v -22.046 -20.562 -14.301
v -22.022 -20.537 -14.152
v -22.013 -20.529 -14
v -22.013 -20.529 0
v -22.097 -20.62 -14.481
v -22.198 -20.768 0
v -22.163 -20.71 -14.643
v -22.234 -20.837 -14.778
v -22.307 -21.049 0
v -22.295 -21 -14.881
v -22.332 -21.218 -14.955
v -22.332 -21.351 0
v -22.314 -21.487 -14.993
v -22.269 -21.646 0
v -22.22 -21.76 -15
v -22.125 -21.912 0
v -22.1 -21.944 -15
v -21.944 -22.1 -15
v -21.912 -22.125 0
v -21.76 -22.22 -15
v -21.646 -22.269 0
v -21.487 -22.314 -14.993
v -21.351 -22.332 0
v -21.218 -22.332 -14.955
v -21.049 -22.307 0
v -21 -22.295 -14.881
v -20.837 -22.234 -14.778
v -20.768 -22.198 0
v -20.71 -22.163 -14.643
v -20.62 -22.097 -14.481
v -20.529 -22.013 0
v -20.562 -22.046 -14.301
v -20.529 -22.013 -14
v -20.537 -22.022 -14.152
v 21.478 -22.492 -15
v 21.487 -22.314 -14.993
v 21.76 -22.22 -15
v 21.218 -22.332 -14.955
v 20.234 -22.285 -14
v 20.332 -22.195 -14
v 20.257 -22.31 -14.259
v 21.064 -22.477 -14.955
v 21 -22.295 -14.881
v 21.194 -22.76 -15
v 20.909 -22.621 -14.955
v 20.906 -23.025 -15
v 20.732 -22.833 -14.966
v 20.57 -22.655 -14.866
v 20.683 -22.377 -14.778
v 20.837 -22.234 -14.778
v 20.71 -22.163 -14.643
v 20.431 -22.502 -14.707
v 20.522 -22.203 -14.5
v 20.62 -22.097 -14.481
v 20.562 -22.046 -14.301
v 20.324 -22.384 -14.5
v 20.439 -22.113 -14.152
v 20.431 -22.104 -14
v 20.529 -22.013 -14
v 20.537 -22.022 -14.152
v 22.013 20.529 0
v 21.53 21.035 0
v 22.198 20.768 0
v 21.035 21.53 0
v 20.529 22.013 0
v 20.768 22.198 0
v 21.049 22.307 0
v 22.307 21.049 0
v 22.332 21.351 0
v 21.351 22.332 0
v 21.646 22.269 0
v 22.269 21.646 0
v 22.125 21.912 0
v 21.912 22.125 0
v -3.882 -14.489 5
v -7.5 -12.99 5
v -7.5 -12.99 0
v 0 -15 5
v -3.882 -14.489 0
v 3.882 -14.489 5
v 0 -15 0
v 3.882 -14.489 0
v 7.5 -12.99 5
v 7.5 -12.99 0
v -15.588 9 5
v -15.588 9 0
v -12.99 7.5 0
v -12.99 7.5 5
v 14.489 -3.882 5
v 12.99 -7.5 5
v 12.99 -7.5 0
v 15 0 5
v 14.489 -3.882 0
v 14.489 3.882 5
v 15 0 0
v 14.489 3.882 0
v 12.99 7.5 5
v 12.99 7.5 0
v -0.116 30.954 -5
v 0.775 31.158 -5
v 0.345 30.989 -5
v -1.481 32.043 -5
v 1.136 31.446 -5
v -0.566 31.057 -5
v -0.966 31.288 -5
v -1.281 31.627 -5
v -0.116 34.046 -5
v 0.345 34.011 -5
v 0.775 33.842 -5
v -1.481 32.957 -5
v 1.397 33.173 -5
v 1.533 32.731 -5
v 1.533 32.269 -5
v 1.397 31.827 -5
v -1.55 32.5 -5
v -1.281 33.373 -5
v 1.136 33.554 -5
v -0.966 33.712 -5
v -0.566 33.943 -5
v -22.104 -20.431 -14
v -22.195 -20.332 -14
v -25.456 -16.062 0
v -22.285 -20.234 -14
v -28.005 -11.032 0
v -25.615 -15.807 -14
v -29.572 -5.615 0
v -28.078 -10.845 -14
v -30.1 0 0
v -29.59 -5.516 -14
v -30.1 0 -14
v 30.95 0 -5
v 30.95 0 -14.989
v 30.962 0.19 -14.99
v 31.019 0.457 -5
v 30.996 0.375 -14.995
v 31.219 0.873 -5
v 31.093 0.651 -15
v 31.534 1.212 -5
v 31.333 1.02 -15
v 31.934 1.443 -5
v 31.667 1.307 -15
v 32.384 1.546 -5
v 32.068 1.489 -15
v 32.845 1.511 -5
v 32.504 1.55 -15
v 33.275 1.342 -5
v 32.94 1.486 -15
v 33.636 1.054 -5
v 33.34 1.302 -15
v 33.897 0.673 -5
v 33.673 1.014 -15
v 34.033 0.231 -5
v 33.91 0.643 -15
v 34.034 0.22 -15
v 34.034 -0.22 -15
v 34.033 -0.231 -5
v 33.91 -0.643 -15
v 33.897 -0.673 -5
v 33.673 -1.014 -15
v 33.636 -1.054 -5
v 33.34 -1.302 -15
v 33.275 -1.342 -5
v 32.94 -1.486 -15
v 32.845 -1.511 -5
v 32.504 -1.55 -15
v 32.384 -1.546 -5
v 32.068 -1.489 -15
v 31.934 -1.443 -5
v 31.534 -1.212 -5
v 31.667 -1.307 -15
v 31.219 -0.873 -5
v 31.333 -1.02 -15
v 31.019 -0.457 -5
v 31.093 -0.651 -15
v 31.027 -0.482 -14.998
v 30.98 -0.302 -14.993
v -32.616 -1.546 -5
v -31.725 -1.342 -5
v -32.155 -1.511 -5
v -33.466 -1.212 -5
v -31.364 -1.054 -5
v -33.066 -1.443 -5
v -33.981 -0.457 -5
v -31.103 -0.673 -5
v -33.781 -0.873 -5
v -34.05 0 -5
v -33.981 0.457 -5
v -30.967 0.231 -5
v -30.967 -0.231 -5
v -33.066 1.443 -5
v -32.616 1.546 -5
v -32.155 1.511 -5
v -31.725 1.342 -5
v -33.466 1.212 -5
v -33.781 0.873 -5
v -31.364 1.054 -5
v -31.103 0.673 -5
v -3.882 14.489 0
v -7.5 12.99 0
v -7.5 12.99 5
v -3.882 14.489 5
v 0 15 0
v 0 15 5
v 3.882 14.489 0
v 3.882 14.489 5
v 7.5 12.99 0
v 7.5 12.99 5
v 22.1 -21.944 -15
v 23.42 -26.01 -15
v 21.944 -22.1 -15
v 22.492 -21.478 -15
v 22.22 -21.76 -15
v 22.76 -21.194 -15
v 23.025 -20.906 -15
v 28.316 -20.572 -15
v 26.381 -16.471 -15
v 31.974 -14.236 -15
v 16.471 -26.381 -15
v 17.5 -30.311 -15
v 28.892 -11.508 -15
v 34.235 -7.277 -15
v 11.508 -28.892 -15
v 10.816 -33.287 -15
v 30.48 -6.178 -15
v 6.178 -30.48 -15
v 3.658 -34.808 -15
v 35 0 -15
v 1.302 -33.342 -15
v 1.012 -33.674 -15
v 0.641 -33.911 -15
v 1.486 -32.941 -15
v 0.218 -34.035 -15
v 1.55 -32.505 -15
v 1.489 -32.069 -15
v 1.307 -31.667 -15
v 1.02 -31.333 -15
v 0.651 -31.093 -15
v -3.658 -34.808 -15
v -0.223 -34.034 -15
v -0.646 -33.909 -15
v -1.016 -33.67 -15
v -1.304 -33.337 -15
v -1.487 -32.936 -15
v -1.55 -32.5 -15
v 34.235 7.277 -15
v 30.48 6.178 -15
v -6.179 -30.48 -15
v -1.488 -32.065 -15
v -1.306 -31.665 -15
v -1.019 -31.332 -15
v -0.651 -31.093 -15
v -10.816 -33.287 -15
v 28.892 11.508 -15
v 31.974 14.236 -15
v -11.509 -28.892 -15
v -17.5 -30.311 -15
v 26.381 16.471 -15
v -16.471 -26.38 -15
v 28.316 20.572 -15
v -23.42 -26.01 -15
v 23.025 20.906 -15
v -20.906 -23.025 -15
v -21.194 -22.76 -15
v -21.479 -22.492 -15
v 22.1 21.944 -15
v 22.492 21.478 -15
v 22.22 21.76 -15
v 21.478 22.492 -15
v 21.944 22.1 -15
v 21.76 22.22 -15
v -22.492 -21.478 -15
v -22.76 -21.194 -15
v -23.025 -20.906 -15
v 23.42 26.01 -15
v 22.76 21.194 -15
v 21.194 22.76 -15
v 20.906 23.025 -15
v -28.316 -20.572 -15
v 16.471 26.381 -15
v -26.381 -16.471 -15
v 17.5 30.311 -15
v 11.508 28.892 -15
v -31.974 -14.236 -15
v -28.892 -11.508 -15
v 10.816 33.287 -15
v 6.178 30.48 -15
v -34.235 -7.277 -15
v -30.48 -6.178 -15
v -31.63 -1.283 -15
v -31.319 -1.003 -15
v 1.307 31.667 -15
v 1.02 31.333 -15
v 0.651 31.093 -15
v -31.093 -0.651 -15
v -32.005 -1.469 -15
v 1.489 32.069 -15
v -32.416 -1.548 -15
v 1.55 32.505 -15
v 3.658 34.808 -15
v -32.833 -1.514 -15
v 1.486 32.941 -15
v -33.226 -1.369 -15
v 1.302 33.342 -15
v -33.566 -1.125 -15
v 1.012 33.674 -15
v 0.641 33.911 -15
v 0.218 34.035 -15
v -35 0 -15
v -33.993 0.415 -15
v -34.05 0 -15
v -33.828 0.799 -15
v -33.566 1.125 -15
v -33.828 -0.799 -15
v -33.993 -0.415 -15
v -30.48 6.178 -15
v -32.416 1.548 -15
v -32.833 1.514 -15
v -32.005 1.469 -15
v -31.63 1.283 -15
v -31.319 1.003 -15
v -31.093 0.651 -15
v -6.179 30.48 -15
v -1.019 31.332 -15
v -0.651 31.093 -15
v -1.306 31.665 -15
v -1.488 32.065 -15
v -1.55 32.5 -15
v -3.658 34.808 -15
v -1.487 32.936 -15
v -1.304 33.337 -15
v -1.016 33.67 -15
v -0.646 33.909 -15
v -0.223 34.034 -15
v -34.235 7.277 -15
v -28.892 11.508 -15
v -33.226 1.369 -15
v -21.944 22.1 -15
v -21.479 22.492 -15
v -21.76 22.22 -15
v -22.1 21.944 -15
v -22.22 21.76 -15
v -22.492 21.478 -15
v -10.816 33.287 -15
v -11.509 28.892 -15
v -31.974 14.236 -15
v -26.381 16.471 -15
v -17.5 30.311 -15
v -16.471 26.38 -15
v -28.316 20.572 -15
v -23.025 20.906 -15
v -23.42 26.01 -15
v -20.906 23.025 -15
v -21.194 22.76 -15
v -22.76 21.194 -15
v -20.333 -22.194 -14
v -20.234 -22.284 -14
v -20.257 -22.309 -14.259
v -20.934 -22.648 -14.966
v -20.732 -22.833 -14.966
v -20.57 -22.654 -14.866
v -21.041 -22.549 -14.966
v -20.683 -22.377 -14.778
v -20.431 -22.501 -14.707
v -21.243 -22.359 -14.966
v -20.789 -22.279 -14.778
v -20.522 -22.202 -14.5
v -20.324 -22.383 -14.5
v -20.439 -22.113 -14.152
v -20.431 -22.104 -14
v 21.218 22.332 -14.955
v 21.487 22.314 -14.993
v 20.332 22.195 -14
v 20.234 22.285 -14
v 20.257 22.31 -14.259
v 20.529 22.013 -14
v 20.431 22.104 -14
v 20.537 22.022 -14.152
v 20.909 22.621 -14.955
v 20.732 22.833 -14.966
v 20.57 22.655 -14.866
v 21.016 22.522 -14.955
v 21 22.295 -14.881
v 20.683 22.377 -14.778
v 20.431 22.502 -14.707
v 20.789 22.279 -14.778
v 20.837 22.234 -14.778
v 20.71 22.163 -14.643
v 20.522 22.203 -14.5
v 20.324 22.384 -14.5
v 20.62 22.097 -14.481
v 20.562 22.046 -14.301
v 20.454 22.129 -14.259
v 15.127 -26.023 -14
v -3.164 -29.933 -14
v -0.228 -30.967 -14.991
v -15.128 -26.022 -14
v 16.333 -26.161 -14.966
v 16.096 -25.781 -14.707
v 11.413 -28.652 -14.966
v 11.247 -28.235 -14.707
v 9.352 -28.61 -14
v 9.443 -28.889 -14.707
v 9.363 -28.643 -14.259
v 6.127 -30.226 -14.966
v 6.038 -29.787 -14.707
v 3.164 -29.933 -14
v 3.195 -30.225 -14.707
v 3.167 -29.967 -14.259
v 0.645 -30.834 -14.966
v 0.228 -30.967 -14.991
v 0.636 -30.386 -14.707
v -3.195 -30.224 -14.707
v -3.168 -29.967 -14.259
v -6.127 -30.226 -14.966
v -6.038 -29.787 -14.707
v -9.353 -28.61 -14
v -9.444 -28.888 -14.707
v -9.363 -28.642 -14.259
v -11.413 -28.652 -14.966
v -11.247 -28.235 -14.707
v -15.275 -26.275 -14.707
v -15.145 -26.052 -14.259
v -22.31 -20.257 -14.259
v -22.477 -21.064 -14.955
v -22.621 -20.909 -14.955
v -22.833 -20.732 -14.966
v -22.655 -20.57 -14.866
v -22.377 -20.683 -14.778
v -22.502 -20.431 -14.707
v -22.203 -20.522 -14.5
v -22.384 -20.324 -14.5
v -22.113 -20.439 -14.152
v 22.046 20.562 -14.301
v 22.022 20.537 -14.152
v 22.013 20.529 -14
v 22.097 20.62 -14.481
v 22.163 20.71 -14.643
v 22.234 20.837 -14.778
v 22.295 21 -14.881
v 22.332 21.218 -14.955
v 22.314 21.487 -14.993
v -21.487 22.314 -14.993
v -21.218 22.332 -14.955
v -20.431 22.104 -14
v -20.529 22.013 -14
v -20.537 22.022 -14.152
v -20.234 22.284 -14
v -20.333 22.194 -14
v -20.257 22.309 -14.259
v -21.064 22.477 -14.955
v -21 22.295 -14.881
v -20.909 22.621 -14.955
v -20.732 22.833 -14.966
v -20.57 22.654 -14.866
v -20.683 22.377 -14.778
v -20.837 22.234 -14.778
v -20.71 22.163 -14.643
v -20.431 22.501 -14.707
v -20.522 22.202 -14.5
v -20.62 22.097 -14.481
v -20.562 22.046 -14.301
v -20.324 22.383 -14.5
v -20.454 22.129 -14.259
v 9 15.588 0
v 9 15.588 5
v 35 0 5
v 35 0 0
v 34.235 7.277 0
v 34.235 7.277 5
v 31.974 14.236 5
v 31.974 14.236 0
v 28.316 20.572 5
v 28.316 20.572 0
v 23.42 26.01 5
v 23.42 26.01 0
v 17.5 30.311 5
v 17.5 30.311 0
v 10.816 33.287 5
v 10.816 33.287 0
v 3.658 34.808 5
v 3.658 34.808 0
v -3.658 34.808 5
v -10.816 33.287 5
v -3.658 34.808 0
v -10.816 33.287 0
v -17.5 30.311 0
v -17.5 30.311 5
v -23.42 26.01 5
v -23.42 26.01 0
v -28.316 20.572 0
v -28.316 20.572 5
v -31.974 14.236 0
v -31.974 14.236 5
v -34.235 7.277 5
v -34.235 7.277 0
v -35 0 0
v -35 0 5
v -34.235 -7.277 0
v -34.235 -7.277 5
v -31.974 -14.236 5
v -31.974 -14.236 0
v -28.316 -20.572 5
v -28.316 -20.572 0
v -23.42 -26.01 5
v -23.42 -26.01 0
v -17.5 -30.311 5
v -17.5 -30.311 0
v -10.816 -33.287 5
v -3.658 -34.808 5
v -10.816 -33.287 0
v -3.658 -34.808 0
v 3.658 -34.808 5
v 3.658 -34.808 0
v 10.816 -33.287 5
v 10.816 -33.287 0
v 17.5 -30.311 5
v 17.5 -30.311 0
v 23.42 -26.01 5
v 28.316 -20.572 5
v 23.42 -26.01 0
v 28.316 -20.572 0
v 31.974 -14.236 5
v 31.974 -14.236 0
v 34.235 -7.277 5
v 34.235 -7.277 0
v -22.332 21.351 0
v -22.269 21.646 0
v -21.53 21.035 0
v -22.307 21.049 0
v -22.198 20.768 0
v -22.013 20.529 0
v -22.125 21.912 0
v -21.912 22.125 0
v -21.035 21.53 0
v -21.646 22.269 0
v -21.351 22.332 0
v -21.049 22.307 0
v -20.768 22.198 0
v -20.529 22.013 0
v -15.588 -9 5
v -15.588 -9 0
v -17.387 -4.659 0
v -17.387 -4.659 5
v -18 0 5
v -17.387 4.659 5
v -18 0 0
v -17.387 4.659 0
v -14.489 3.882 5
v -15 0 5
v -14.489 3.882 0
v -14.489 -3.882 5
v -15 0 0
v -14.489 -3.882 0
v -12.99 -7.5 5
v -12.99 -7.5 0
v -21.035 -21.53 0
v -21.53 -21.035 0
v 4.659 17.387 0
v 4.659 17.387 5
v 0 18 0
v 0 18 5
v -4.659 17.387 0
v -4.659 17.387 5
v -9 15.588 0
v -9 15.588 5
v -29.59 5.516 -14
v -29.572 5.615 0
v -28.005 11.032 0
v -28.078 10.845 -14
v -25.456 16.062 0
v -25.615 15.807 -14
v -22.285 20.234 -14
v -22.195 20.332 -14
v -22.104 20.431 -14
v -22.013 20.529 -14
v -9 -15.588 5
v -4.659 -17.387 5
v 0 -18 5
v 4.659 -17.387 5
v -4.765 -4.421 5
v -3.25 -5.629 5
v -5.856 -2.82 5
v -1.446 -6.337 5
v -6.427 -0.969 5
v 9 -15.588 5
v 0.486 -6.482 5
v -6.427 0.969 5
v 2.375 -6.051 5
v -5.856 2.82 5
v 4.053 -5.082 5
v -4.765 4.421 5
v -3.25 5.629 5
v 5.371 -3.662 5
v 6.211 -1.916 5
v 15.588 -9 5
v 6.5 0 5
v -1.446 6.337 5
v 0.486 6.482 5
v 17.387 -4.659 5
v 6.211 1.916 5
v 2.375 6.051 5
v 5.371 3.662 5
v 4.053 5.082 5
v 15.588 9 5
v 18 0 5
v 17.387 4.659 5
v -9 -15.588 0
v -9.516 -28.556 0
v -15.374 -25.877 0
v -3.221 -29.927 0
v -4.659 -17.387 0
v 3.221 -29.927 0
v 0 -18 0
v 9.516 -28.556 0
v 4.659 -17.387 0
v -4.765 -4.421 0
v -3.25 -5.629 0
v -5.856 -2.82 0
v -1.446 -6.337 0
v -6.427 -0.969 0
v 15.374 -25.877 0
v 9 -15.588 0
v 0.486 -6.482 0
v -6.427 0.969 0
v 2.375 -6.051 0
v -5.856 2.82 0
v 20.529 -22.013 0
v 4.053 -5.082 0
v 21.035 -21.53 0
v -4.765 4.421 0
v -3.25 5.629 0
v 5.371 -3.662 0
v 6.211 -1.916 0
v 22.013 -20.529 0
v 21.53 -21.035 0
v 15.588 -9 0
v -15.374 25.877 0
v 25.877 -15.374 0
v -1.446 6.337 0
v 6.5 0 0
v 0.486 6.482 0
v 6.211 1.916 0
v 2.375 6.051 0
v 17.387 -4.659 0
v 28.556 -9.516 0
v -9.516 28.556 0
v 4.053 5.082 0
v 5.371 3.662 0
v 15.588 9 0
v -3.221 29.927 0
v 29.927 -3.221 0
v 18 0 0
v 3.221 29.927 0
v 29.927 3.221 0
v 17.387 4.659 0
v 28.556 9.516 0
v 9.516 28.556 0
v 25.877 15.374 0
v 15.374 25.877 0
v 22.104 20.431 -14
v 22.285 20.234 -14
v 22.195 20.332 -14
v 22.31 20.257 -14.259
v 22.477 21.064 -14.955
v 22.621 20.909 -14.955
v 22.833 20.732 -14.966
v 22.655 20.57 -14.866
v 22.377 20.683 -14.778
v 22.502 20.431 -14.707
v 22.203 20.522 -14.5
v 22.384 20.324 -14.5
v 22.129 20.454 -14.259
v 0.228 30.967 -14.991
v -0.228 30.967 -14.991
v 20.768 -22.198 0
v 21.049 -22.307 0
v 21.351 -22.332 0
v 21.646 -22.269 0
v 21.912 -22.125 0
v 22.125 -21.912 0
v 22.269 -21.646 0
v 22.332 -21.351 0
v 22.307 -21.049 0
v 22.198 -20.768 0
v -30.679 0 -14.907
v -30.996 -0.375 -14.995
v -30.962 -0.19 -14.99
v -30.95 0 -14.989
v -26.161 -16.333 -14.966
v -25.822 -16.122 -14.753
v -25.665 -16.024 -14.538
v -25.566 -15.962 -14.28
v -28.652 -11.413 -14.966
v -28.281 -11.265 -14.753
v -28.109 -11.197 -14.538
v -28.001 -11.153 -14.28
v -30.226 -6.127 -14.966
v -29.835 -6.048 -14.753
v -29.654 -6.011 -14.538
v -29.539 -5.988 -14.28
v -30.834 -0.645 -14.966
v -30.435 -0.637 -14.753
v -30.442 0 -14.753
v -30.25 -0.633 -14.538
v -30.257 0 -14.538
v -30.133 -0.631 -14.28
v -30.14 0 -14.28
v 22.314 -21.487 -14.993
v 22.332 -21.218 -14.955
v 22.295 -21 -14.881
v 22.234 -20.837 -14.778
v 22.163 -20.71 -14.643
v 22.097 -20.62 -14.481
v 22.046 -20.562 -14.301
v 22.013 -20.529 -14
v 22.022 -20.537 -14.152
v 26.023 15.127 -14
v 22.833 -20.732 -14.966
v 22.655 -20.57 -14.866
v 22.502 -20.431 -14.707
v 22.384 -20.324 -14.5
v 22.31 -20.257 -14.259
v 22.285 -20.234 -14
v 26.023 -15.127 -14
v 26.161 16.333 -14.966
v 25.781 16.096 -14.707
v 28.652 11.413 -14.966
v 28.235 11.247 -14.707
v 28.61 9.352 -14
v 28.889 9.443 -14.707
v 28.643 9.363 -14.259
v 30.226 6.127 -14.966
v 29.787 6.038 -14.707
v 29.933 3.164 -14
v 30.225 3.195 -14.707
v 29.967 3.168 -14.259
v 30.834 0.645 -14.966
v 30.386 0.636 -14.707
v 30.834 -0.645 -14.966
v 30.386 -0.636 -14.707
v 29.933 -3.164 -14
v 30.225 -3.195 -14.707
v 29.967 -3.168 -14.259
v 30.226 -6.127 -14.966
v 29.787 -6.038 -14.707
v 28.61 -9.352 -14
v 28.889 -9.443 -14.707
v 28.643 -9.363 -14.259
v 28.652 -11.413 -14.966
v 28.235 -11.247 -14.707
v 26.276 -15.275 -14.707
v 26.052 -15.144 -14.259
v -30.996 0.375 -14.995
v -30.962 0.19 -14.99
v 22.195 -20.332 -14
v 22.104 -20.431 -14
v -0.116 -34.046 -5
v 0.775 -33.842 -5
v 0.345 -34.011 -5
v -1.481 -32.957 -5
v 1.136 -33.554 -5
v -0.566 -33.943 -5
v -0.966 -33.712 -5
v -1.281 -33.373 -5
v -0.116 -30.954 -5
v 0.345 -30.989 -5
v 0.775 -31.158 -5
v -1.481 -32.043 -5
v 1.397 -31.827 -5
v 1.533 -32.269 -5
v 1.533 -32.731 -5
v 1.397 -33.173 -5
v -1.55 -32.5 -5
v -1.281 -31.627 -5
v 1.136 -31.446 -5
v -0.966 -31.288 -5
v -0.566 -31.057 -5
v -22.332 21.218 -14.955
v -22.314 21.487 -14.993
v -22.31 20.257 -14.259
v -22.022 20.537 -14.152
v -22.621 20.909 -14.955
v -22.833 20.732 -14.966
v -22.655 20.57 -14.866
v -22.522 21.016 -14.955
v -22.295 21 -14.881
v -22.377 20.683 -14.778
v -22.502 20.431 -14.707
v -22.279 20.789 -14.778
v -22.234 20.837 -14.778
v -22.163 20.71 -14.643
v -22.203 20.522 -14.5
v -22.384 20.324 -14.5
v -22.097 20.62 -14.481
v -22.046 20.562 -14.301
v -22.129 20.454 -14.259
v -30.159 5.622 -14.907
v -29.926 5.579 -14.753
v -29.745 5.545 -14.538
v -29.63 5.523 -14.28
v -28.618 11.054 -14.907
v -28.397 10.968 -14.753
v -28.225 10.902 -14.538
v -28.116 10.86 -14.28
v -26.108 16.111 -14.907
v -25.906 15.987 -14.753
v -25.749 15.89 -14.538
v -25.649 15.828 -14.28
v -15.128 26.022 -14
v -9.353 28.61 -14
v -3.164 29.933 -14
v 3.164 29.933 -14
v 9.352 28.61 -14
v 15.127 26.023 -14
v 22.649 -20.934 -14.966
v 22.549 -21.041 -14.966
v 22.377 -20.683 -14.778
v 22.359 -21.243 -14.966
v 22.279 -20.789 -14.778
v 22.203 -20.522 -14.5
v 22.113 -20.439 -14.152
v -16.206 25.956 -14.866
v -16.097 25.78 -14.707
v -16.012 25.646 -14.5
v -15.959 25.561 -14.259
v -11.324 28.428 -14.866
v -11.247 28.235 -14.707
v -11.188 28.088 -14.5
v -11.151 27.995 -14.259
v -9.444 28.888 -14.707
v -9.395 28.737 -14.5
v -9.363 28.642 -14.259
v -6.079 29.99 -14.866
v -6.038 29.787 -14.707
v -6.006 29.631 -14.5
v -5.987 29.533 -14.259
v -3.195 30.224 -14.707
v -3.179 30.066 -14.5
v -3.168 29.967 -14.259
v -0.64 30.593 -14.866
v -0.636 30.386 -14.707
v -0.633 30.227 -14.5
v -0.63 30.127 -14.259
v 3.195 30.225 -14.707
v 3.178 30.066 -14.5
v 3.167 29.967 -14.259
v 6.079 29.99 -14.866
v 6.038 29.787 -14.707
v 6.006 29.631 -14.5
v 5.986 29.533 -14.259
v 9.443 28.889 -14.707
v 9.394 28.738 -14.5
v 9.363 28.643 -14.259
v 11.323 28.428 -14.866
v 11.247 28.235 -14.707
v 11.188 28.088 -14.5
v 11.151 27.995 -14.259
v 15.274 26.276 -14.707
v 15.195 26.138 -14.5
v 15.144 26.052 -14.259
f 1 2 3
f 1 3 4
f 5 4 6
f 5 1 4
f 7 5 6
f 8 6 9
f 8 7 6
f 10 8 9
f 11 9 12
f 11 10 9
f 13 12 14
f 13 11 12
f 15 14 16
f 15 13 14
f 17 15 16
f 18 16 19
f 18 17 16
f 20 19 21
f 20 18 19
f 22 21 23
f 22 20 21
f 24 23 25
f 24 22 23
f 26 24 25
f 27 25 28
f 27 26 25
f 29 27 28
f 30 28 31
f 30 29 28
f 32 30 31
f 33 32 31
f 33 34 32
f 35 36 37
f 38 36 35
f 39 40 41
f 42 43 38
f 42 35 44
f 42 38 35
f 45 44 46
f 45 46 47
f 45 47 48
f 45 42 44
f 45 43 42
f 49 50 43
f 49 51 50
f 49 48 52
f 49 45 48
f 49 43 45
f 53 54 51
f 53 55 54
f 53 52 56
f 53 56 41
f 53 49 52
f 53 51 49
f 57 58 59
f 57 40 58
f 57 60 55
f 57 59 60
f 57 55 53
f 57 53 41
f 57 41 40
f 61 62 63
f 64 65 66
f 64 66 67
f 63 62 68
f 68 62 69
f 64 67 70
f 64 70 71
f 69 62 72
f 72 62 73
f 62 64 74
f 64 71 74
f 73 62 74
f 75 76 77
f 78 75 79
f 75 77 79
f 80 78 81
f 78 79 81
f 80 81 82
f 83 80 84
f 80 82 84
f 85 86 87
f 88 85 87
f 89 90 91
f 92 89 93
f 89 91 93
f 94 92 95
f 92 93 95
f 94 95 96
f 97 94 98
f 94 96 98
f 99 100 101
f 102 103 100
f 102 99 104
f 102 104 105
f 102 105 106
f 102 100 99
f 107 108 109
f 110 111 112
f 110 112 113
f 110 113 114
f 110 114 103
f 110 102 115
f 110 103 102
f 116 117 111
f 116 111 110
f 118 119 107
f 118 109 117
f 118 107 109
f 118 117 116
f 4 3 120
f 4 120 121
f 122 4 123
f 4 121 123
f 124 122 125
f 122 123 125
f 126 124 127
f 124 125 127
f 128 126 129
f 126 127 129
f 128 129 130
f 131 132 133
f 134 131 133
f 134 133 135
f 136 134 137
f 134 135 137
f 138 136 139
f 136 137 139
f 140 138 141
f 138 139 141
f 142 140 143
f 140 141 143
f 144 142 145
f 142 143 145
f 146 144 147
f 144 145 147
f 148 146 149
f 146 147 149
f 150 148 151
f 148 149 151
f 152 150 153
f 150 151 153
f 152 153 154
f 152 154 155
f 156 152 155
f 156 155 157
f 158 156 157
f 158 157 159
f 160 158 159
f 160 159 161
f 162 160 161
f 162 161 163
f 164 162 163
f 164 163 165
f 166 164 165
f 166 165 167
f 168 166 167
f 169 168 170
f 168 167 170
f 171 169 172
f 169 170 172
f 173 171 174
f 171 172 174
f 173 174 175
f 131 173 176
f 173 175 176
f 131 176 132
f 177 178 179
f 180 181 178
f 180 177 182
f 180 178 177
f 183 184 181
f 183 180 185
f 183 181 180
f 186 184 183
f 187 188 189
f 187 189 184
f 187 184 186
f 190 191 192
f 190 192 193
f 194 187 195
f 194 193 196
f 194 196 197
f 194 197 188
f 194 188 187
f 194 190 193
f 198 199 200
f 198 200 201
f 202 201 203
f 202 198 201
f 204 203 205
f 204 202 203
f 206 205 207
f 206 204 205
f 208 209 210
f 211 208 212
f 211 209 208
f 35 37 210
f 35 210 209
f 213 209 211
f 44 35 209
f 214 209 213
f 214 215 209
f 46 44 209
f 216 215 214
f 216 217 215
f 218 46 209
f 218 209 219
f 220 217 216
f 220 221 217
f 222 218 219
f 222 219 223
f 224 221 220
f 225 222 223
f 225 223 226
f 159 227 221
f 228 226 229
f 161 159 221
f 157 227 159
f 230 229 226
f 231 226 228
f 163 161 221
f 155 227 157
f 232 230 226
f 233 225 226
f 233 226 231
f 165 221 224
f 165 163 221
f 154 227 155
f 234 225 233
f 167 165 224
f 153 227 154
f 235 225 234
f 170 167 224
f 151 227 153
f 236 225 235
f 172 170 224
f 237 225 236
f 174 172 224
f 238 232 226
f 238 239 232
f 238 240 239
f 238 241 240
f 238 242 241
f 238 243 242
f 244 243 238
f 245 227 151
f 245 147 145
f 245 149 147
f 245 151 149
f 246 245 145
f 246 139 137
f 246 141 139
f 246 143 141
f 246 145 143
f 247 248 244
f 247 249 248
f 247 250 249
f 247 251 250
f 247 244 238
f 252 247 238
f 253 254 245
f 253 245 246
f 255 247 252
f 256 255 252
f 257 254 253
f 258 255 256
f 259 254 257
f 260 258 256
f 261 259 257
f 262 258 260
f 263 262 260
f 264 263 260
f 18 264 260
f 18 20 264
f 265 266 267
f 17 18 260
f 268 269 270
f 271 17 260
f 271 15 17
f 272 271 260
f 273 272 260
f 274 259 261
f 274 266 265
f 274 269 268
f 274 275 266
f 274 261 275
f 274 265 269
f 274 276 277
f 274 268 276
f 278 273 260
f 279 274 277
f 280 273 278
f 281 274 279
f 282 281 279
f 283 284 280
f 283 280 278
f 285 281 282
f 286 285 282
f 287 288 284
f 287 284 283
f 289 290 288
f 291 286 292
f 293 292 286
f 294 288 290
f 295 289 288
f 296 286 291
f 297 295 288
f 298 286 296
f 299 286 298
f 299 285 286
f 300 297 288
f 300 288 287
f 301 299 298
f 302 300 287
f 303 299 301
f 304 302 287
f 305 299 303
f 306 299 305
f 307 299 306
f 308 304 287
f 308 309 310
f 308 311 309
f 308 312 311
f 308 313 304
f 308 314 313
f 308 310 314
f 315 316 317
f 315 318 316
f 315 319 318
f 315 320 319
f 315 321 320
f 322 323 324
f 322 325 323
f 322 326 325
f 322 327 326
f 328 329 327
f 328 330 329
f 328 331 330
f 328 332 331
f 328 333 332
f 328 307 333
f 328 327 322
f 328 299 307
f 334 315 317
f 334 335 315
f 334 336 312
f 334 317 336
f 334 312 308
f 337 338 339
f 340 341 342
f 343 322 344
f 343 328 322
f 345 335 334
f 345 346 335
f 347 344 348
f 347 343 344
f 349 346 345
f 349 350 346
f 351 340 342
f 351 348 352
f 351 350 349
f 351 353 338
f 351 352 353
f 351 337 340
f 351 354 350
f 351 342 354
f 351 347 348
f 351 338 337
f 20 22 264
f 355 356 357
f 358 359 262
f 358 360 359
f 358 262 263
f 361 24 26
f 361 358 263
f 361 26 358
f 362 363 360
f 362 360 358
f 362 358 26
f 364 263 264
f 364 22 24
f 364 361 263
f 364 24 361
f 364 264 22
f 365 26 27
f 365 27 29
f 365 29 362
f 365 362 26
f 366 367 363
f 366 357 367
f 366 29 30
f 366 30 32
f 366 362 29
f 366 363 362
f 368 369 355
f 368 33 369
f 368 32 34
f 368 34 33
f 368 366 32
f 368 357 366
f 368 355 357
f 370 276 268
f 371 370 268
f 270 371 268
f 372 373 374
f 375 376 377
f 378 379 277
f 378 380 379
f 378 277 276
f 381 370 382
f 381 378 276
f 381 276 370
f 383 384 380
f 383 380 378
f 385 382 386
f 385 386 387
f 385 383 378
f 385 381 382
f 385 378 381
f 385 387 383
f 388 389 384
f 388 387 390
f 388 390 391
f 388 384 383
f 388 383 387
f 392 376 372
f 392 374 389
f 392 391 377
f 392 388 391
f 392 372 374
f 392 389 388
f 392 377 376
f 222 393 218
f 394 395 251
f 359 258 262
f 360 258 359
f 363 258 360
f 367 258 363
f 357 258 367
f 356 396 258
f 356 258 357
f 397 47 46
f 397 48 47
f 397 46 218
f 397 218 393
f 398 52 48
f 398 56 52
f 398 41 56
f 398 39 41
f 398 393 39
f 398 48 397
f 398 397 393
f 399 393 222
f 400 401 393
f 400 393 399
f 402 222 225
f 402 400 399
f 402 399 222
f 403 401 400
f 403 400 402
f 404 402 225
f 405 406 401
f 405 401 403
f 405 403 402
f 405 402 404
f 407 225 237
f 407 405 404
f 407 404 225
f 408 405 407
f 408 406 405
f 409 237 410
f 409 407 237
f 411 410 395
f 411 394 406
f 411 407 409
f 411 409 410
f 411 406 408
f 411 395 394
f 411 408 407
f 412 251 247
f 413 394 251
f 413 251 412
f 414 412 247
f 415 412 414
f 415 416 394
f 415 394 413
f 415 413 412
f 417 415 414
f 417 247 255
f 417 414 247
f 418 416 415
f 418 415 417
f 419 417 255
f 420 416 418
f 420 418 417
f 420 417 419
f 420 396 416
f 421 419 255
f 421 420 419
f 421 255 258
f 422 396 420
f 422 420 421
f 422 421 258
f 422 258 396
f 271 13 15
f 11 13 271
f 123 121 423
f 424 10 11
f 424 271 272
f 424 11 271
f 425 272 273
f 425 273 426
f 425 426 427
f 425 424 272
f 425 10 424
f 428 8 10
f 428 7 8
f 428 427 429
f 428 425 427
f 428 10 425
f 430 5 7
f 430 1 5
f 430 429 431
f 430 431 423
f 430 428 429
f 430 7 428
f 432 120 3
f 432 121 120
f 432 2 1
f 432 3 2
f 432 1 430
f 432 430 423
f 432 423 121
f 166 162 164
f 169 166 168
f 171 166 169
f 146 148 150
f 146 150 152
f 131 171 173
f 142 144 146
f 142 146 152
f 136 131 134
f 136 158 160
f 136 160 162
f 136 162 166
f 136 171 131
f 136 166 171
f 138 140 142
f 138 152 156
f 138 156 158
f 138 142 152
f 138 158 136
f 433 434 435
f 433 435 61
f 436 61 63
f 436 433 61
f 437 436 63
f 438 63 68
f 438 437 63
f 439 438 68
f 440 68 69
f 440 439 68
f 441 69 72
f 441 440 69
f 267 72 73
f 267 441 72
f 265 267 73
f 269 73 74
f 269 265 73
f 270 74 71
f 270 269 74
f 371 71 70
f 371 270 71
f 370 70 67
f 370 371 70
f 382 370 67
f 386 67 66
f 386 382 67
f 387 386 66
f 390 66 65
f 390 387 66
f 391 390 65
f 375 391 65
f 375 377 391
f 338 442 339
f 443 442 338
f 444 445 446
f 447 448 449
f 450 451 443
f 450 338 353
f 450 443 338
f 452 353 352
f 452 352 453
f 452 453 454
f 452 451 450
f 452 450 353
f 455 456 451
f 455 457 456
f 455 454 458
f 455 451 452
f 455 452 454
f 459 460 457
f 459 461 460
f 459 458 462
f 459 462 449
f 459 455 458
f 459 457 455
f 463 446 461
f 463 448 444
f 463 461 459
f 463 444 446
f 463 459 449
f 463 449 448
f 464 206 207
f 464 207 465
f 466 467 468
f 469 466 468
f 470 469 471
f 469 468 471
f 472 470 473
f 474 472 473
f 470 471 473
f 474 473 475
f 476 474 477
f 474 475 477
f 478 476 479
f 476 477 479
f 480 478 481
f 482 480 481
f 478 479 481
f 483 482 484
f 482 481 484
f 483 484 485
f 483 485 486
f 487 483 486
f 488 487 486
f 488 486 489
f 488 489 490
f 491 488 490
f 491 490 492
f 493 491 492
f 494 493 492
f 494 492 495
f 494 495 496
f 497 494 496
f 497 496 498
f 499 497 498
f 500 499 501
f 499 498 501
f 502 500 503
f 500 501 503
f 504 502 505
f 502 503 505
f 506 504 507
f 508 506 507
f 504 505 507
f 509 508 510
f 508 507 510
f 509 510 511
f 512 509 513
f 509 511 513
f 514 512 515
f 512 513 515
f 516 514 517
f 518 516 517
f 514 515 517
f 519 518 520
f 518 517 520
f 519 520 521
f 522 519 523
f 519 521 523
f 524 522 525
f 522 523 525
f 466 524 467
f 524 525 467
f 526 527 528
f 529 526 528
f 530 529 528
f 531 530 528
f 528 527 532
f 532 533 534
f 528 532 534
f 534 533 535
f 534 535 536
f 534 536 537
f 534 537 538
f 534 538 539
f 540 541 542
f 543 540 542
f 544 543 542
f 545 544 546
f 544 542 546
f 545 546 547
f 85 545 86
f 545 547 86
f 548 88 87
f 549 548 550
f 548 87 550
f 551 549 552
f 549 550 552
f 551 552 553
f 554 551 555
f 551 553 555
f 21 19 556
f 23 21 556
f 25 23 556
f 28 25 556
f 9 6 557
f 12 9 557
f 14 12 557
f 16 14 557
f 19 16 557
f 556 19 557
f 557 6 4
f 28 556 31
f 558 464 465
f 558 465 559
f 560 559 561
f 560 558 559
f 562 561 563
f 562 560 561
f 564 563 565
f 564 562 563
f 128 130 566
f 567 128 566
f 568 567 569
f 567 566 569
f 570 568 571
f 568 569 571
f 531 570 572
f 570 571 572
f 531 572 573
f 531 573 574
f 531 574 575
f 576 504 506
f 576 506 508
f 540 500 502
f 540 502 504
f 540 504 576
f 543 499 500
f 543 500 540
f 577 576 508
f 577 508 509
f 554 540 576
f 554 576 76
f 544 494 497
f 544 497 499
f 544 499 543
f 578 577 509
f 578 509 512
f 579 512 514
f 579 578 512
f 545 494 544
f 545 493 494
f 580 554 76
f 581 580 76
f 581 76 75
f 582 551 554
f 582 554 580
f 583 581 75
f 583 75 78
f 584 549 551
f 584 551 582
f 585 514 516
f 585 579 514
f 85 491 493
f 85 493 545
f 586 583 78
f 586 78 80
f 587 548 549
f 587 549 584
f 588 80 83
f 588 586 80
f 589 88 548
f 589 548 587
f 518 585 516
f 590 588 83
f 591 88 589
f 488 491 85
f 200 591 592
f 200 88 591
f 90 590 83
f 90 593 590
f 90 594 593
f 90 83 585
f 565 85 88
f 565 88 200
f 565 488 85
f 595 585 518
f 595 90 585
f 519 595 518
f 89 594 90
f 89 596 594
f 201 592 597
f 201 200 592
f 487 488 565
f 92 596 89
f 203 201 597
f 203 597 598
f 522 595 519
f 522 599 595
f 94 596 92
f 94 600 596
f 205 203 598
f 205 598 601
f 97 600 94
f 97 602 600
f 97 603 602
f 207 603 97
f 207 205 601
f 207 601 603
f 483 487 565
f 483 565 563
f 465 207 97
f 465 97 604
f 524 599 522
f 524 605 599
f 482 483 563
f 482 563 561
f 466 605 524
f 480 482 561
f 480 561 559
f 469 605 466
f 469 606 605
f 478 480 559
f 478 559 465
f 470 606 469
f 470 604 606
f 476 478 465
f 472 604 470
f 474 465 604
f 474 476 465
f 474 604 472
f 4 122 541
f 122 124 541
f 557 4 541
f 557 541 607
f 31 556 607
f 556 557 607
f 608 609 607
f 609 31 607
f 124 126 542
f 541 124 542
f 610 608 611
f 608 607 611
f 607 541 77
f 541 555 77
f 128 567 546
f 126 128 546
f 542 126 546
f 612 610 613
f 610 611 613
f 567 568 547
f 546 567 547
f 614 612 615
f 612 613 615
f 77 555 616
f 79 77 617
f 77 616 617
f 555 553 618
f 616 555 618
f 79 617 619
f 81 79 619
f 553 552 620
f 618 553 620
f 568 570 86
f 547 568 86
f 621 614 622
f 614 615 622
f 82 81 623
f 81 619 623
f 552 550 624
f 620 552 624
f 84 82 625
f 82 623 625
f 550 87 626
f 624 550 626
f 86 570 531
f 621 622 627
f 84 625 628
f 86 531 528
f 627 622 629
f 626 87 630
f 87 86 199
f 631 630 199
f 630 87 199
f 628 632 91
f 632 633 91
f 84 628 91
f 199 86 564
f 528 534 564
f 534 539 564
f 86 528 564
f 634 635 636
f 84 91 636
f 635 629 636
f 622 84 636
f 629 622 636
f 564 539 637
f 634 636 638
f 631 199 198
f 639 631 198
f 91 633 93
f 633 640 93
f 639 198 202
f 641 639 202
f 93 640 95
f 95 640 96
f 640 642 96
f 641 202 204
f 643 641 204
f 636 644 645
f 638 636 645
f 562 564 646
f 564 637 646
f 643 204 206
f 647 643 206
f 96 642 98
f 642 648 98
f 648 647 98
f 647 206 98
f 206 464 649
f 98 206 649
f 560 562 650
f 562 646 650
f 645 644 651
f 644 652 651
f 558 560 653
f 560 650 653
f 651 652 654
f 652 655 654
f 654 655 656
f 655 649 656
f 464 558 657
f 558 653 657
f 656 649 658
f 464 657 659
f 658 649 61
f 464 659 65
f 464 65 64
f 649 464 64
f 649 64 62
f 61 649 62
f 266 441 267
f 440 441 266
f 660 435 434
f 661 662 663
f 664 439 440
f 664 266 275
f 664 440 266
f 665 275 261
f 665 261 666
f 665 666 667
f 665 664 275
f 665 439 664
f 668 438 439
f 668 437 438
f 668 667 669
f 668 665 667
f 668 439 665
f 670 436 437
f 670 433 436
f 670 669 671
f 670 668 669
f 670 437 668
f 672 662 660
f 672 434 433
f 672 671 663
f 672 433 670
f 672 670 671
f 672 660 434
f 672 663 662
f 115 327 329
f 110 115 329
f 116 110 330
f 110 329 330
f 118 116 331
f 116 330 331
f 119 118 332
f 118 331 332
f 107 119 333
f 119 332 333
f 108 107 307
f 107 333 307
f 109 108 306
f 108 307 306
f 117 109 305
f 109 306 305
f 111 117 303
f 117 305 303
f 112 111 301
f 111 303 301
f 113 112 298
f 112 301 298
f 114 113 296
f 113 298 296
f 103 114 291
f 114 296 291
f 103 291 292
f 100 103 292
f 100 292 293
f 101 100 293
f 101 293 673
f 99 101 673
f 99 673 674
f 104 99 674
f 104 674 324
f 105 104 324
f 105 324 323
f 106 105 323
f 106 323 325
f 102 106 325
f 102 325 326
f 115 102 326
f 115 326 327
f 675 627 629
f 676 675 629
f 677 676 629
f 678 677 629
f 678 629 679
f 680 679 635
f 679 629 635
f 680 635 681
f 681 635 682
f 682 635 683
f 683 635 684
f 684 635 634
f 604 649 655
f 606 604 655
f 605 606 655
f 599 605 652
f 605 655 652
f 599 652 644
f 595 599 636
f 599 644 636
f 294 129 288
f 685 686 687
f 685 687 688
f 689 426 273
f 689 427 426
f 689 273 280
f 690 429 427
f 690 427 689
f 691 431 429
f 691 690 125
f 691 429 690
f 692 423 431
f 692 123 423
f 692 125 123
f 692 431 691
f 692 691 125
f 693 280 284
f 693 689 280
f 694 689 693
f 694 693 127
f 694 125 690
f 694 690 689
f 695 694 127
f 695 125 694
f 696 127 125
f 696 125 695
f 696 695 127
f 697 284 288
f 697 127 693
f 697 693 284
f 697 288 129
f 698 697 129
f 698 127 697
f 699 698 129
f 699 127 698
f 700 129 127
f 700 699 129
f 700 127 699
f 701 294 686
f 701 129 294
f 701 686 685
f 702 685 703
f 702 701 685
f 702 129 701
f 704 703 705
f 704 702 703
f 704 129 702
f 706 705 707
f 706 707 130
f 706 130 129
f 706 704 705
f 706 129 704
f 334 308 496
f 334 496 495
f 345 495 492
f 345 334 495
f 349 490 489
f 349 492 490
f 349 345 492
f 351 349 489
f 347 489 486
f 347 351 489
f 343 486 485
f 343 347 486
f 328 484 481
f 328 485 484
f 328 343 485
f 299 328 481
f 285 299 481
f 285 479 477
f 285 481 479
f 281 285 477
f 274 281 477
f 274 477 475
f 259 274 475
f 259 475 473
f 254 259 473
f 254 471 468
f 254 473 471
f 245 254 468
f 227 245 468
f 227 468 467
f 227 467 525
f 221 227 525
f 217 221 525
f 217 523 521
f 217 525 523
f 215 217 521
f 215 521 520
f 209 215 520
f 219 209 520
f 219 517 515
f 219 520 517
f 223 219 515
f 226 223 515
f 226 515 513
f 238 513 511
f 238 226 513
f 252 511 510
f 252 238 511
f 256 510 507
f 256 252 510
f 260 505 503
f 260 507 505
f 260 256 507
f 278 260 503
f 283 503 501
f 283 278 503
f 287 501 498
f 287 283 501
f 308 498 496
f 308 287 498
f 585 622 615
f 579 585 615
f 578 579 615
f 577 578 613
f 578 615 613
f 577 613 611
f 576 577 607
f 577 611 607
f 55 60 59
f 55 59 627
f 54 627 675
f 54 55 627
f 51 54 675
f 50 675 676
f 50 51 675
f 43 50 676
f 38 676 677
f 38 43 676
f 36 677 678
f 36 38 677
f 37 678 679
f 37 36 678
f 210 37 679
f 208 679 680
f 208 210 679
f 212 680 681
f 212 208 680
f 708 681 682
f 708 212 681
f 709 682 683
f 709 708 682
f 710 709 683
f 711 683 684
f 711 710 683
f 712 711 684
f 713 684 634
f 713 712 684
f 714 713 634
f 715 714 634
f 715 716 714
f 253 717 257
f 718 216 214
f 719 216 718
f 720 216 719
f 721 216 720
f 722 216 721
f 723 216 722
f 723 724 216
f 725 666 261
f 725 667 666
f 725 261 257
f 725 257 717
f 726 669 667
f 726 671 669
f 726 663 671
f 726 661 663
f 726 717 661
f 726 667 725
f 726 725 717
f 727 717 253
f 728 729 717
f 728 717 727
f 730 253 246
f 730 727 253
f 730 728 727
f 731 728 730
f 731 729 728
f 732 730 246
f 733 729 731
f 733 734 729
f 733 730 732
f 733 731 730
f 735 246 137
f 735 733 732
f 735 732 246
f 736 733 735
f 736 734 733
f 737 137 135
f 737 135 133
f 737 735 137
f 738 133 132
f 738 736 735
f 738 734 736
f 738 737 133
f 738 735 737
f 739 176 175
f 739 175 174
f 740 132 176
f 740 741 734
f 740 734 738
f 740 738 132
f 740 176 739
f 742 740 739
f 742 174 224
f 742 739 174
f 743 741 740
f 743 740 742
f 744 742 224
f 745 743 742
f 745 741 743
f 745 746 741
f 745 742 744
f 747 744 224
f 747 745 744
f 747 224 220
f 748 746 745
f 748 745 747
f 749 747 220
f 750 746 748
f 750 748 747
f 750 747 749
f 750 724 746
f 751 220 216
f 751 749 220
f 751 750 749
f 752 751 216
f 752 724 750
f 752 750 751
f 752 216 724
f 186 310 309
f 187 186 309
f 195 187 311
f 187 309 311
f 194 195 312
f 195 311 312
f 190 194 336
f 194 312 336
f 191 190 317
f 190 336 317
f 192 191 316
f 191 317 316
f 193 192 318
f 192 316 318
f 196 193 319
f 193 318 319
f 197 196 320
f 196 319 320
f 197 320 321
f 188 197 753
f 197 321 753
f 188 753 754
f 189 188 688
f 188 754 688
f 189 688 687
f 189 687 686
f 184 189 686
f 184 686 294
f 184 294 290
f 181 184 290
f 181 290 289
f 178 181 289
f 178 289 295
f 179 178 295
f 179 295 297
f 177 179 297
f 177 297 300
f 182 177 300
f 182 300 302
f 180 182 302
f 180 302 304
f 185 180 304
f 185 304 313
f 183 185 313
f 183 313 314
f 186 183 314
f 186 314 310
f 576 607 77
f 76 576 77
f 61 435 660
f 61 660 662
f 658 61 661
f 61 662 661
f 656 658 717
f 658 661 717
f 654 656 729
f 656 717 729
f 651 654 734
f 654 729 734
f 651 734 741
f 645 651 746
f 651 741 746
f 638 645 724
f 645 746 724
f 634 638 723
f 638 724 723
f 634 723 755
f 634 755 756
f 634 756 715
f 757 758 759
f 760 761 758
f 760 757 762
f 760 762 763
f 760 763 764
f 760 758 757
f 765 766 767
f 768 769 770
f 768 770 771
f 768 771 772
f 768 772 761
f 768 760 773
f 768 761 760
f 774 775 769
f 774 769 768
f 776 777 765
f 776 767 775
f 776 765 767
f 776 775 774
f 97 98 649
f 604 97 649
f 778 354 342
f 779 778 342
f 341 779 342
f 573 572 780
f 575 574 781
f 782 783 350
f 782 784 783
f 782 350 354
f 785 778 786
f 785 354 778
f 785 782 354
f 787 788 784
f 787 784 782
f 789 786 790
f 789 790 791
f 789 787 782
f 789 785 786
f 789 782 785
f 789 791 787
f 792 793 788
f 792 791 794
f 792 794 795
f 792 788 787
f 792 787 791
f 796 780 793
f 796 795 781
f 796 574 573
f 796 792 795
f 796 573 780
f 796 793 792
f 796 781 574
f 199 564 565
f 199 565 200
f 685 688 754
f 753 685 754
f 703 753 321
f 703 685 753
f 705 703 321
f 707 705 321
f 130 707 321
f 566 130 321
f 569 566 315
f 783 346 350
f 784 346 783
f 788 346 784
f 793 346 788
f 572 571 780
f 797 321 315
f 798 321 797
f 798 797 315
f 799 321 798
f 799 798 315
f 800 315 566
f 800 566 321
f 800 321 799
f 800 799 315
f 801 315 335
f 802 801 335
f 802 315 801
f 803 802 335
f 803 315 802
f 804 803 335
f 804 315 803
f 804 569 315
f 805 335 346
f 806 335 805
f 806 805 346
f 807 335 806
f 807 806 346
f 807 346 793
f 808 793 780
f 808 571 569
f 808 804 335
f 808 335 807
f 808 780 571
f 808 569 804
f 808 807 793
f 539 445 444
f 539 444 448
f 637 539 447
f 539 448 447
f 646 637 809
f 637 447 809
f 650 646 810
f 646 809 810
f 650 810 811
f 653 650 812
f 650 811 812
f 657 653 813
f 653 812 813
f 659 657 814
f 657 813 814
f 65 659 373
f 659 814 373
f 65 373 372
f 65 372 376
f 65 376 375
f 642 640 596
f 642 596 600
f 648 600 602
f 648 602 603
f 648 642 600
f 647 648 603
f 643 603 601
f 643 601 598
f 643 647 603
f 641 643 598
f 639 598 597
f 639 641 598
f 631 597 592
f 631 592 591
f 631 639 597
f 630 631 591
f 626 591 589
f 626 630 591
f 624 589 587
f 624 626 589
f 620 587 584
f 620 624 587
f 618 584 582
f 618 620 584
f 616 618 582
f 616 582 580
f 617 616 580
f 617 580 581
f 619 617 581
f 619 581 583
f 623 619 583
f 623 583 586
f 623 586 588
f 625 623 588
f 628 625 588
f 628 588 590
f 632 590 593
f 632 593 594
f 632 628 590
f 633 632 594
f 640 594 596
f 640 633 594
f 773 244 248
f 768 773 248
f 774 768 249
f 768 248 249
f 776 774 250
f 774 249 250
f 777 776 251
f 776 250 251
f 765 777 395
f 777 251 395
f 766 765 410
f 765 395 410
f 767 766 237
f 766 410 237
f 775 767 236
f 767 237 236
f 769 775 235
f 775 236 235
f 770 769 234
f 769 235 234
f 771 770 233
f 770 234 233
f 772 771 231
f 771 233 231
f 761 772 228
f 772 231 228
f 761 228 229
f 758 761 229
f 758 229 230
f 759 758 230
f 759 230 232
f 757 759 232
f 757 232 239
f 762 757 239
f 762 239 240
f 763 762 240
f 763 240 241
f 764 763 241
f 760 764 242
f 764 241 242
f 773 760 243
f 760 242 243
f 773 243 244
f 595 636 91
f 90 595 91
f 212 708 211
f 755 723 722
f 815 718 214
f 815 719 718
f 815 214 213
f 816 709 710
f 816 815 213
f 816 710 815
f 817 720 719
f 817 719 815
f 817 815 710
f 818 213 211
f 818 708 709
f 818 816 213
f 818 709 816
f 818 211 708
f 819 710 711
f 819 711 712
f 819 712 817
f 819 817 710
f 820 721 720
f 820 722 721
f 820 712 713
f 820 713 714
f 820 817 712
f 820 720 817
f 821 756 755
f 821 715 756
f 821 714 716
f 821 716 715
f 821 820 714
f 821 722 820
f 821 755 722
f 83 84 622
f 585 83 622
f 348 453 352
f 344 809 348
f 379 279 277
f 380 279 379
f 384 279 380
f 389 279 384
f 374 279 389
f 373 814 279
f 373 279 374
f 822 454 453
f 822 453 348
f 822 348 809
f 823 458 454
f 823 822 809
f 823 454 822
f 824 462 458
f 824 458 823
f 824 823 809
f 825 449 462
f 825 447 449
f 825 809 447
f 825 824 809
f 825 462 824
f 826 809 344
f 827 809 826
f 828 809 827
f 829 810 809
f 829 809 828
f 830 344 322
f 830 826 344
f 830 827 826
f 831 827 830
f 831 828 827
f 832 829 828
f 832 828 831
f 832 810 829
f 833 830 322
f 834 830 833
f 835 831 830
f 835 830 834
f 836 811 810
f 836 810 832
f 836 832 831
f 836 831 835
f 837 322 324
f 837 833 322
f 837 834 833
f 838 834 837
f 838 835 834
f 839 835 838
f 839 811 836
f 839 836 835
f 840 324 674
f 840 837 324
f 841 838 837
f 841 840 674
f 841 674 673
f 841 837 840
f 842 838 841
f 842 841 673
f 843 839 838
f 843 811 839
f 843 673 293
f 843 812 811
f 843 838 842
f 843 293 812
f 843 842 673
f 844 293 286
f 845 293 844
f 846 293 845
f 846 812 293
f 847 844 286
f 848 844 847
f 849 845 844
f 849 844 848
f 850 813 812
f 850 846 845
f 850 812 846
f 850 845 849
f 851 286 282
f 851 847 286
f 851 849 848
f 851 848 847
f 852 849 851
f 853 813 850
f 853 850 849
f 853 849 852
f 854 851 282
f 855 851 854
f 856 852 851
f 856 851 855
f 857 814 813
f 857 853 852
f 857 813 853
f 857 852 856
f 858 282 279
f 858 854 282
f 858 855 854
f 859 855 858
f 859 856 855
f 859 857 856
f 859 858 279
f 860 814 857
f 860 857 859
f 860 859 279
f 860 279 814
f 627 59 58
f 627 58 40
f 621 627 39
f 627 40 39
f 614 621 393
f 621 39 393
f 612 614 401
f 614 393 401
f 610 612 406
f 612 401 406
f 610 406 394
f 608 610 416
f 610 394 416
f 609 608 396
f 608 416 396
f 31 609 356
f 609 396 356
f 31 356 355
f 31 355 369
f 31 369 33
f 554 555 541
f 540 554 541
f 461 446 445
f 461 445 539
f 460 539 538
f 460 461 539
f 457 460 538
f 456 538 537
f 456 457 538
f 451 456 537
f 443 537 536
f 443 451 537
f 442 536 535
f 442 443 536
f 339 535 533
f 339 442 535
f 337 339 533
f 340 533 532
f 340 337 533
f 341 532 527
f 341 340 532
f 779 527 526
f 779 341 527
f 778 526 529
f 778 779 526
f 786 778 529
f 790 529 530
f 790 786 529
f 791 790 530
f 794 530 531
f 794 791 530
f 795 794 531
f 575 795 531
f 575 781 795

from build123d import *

# Parameters (mm, degrees)
SKETCH_2_R          = 35
SKETCH_2_R_2        = 6.5
EXTRUDE_1_DEPTH     = 5
EXTRUDE_START       = 15
SKETCH_3_R          = 35
SKETCH_3_R_2        = 30.1
EXTRUDE_2_DEPTH     = 15
SKETCH_4_R          = 1.55
CUT_EXTRUDE_1_DEPTH = 10
CUT_EXTRUDE_2_DEPTH = 52.720402164
CUT_EXTRUDE_5_DEPTH = 15
FILLET_1_R          = 1


with BuildPart() as part:
    # 草图2 → 凸台-拉伸1 (new body)
    with BuildSketch(Plane.XY):
        Circle(SKETCH_2_R)
        Circle(SKETCH_2_R_2, mode=Mode.SUBTRACT)
    extrude(amount=EXTRUDE_1_DEPTH)

    # 草图3 → 凸台-拉伸2 (add)
    with BuildSketch(Plane(origin=(0, 0, 0), x_dir=(-1, 0, 0), z_dir=(0, 0, -1)).offset(EXTRUDE_START)):
        Circle(SKETCH_3_R)
        Circle(SKETCH_3_R_2, mode=Mode.SUBTRACT)
    extrude(amount=-EXTRUDE_2_DEPTH)

    # 草图4 → 切除-拉伸1 (cut)
    with BuildSketch(Plane(origin=(0, 0, -15), x_dir=(-1, 0, 0), z_dir=(0, 0, -1))):
        with Locations((0, 32.5)):
            Circle(SKETCH_4_R)
        with Locations((32.5, 0)):
            Circle(SKETCH_4_R)
        with Locations((0, -32.5)):
            Circle(SKETCH_4_R)
        with Locations((-32.5, 0)):
            Circle(SKETCH_4_R)
    extrude(amount=-CUT_EXTRUDE_1_DEPTH, mode=Mode.SUBTRACT)

    # 草图5 → 切除-拉伸2 (cut, through all)
    with BuildSketch(Plane(origin=(0, 0, 0), x_dir=(-1, 0, 0), z_dir=(0, 0, -1))):
        with BuildLine():
            Line((12.990381057, -7.5), (15.588457268, -9))
            ThreePointArc((15.588457268, -9), (18, 0), (15.588457268, 9))
            Line((15.588457268, 9), (12.990381057, 7.5))
            ThreePointArc((12.990381057, 7.5), (15, 0), (12.990381057, -7.5))
        make_face()
        with BuildLine():
            Line((-7.5, 12.990381057), (-9, 15.588457268))
            ThreePointArc((-9, 15.588457268), (0, 18), (9, 15.588457268))
            Line((9, 15.588457268), (7.5, 12.990381057))
            ThreePointArc((7.5, 12.990381057), (0, 15), (-7.5, 12.990381057))
        make_face()
        with BuildLine():
            Line((-7.5, -12.990381057), (-9, -15.588457268))
            ThreePointArc((-9, -15.588457268), (0, -18), (9, -15.588457268))
            Line((9, -15.588457268), (7.5, -12.990381057))
            ThreePointArc((7.5, -12.990381057), (0, -15), (-7.5, -12.990381057))
        make_face()
        with BuildLine():
            Line((-12.990381057, 7.5), (-15.588457268, 9))
            ThreePointArc((-15.588457268, 9), (-18, 0), (-15.588457268, -9))
            Line((-15.588457268, -9), (-12.990381057, -7.5))
            ThreePointArc((-12.990381057, -7.5), (-15, 0), (-12.990381057, 7.5))
        make_face()
    extrude(amount=-CUT_EXTRUDE_2_DEPTH, mode=Mode.SUBTRACT)

    # 草图9 → 切除-拉伸5 (cut)
    with BuildSketch(Plane(origin=(0, 0, -15), x_dir=(-1, 0, 0), z_dir=(0, 0, -1))):
        with BuildLine():
            ThreePointArc((-22.013313369, 20.528615017), (-22.026376234, 22.026376234), (-20.528615017, 22.013313369))
            ThreePointArc((-20.528615017, 22.013313369), (-21.283914114, 21.283914114), (-22.013313369, 20.528615017))
        make_face()
        with BuildLine():
            ThreePointArc((20.528615017, 22.013313369), (22.026376234, 22.026376234), (22.013313369, 20.528615017))
            ThreePointArc((22.013313369, 20.528615017), (21.283914114, 21.283914114), (20.528615017, 22.013313369))
        make_face()
        with BuildLine():
            ThreePointArc((22.013313369, -20.528615017), (22.026376234, -22.026376234), (20.528615017, -22.013313369))
            ThreePointArc((20.528615017, -22.013313369), (21.283914114, -21.283914114), (22.013313369, -20.528615017))
        make_face()
        with BuildLine():
            ThreePointArc((-20.528615017, -22.013313369), (-22.026376234, -22.026376234), (-22.013313369, -20.528615017))
            ThreePointArc((-22.013313369, -20.528615017), (-21.283914114, -21.283914114), (-20.528615017, -22.013313369))
        make_face()
    extrude(amount=-CUT_EXTRUDE_5_DEPTH, mode=Mode.SUBTRACT)

    # 圆角1
    # the kernel refuses this fillet: 1 mm, written as the material it takes off along each edge
    with BuildSketch(Plane(origin=(0, 0, -15), x_dir=(-0.7403558797037455, 0.6722151228498904, 0), z_dir=(-0.6722151228498904, -0.7403558797037455, 0))) as fillet_1_piece_1:
        with BuildLine():
            CenterArc((30.1 + FILLET_1_R, -FILLET_1_R), FILLET_1_R, 90, 90)
            Line((30.1, -FILLET_1_R), (30.1, 0))
            Line((30.1, 0), (30.1 + FILLET_1_R, 0))
        make_face()
    revolve(axis=Axis((0, 0, -15), (0, 0, -1)), revolution_arc=95.523479776, mode=Mode.SUBTRACT)
    with BuildSketch(Plane(origin=(0, 0, -15), x_dir=(0.6722151228498918, 0.7403558797037441, 0), z_dir=(-0.7403558797037441, 0.6722151228498918, 0))) as fillet_1_piece_2:
        with BuildLine():
            CenterArc((30.1 + FILLET_1_R, -FILLET_1_R), FILLET_1_R, 90, 90)
            Line((30.1, -FILLET_1_R), (30.1, 0))
            Line((30.1, 0), (30.1 + FILLET_1_R, 0))
        make_face()
    revolve(axis=Axis((0, 0, -15), (0, 0, -1)), revolution_arc=95.523479776, mode=Mode.SUBTRACT)
    with BuildSketch(Plane(origin=(0, 0, -15), x_dir=(0.7403558797037453, -0.6722151228498905, 0), z_dir=(0.6722151228498905, 0.7403558797037453, 0))) as fillet_1_piece_3:
        with BuildLine():
            CenterArc((30.1 + FILLET_1_R, -FILLET_1_R), FILLET_1_R, 90, 90)
            Line((30.1, -FILLET_1_R), (30.1, 0))
            Line((30.1, 0), (30.1 + FILLET_1_R, 0))
        make_face()
    revolve(axis=Axis((0, 0, -15), (0, 0, -1)), revolution_arc=95.523479776, mode=Mode.SUBTRACT)
    with BuildSketch(Plane(origin=(0, 0, -15), x_dir=(-1, 0, 0), z_dir=(0, -1, 0))) as fillet_1_piece_4:
        with BuildLine():
            CenterArc((30.1 + FILLET_1_R, -FILLET_1_R), FILLET_1_R, 90, 90)
            Line((30.1, -FILLET_1_R), (30.1, 0))
            Line((30.1, 0), (30.1 + FILLET_1_R, 0))
        make_face()
    revolve(axis=Axis((0, 0, -15), (0, 0, -1)), revolution_arc=47.760430641, mode=Mode.SUBTRACT)
    with BuildSketch(Plane(origin=(0, 0, -15), x_dir=(-0.6722320403041436, -0.7403405189428228, 0), z_dir=(0.7403405189428228, -0.6722320403041436, 0))) as fillet_1_piece_5:
        with BuildLine():
            CenterArc((30.1 + FILLET_1_R, -FILLET_1_R), FILLET_1_R, 90, 90)
            Line((30.1, -FILLET_1_R), (30.1, 0))
            Line((30.1, 0), (30.1 + FILLET_1_R, 0))
        make_face()
    revolve(axis=Axis((0, 0, -15), (0, 0, -1)), revolution_arc=47.760430641, mode=Mode.SUBTRACT)


solid = part.part
